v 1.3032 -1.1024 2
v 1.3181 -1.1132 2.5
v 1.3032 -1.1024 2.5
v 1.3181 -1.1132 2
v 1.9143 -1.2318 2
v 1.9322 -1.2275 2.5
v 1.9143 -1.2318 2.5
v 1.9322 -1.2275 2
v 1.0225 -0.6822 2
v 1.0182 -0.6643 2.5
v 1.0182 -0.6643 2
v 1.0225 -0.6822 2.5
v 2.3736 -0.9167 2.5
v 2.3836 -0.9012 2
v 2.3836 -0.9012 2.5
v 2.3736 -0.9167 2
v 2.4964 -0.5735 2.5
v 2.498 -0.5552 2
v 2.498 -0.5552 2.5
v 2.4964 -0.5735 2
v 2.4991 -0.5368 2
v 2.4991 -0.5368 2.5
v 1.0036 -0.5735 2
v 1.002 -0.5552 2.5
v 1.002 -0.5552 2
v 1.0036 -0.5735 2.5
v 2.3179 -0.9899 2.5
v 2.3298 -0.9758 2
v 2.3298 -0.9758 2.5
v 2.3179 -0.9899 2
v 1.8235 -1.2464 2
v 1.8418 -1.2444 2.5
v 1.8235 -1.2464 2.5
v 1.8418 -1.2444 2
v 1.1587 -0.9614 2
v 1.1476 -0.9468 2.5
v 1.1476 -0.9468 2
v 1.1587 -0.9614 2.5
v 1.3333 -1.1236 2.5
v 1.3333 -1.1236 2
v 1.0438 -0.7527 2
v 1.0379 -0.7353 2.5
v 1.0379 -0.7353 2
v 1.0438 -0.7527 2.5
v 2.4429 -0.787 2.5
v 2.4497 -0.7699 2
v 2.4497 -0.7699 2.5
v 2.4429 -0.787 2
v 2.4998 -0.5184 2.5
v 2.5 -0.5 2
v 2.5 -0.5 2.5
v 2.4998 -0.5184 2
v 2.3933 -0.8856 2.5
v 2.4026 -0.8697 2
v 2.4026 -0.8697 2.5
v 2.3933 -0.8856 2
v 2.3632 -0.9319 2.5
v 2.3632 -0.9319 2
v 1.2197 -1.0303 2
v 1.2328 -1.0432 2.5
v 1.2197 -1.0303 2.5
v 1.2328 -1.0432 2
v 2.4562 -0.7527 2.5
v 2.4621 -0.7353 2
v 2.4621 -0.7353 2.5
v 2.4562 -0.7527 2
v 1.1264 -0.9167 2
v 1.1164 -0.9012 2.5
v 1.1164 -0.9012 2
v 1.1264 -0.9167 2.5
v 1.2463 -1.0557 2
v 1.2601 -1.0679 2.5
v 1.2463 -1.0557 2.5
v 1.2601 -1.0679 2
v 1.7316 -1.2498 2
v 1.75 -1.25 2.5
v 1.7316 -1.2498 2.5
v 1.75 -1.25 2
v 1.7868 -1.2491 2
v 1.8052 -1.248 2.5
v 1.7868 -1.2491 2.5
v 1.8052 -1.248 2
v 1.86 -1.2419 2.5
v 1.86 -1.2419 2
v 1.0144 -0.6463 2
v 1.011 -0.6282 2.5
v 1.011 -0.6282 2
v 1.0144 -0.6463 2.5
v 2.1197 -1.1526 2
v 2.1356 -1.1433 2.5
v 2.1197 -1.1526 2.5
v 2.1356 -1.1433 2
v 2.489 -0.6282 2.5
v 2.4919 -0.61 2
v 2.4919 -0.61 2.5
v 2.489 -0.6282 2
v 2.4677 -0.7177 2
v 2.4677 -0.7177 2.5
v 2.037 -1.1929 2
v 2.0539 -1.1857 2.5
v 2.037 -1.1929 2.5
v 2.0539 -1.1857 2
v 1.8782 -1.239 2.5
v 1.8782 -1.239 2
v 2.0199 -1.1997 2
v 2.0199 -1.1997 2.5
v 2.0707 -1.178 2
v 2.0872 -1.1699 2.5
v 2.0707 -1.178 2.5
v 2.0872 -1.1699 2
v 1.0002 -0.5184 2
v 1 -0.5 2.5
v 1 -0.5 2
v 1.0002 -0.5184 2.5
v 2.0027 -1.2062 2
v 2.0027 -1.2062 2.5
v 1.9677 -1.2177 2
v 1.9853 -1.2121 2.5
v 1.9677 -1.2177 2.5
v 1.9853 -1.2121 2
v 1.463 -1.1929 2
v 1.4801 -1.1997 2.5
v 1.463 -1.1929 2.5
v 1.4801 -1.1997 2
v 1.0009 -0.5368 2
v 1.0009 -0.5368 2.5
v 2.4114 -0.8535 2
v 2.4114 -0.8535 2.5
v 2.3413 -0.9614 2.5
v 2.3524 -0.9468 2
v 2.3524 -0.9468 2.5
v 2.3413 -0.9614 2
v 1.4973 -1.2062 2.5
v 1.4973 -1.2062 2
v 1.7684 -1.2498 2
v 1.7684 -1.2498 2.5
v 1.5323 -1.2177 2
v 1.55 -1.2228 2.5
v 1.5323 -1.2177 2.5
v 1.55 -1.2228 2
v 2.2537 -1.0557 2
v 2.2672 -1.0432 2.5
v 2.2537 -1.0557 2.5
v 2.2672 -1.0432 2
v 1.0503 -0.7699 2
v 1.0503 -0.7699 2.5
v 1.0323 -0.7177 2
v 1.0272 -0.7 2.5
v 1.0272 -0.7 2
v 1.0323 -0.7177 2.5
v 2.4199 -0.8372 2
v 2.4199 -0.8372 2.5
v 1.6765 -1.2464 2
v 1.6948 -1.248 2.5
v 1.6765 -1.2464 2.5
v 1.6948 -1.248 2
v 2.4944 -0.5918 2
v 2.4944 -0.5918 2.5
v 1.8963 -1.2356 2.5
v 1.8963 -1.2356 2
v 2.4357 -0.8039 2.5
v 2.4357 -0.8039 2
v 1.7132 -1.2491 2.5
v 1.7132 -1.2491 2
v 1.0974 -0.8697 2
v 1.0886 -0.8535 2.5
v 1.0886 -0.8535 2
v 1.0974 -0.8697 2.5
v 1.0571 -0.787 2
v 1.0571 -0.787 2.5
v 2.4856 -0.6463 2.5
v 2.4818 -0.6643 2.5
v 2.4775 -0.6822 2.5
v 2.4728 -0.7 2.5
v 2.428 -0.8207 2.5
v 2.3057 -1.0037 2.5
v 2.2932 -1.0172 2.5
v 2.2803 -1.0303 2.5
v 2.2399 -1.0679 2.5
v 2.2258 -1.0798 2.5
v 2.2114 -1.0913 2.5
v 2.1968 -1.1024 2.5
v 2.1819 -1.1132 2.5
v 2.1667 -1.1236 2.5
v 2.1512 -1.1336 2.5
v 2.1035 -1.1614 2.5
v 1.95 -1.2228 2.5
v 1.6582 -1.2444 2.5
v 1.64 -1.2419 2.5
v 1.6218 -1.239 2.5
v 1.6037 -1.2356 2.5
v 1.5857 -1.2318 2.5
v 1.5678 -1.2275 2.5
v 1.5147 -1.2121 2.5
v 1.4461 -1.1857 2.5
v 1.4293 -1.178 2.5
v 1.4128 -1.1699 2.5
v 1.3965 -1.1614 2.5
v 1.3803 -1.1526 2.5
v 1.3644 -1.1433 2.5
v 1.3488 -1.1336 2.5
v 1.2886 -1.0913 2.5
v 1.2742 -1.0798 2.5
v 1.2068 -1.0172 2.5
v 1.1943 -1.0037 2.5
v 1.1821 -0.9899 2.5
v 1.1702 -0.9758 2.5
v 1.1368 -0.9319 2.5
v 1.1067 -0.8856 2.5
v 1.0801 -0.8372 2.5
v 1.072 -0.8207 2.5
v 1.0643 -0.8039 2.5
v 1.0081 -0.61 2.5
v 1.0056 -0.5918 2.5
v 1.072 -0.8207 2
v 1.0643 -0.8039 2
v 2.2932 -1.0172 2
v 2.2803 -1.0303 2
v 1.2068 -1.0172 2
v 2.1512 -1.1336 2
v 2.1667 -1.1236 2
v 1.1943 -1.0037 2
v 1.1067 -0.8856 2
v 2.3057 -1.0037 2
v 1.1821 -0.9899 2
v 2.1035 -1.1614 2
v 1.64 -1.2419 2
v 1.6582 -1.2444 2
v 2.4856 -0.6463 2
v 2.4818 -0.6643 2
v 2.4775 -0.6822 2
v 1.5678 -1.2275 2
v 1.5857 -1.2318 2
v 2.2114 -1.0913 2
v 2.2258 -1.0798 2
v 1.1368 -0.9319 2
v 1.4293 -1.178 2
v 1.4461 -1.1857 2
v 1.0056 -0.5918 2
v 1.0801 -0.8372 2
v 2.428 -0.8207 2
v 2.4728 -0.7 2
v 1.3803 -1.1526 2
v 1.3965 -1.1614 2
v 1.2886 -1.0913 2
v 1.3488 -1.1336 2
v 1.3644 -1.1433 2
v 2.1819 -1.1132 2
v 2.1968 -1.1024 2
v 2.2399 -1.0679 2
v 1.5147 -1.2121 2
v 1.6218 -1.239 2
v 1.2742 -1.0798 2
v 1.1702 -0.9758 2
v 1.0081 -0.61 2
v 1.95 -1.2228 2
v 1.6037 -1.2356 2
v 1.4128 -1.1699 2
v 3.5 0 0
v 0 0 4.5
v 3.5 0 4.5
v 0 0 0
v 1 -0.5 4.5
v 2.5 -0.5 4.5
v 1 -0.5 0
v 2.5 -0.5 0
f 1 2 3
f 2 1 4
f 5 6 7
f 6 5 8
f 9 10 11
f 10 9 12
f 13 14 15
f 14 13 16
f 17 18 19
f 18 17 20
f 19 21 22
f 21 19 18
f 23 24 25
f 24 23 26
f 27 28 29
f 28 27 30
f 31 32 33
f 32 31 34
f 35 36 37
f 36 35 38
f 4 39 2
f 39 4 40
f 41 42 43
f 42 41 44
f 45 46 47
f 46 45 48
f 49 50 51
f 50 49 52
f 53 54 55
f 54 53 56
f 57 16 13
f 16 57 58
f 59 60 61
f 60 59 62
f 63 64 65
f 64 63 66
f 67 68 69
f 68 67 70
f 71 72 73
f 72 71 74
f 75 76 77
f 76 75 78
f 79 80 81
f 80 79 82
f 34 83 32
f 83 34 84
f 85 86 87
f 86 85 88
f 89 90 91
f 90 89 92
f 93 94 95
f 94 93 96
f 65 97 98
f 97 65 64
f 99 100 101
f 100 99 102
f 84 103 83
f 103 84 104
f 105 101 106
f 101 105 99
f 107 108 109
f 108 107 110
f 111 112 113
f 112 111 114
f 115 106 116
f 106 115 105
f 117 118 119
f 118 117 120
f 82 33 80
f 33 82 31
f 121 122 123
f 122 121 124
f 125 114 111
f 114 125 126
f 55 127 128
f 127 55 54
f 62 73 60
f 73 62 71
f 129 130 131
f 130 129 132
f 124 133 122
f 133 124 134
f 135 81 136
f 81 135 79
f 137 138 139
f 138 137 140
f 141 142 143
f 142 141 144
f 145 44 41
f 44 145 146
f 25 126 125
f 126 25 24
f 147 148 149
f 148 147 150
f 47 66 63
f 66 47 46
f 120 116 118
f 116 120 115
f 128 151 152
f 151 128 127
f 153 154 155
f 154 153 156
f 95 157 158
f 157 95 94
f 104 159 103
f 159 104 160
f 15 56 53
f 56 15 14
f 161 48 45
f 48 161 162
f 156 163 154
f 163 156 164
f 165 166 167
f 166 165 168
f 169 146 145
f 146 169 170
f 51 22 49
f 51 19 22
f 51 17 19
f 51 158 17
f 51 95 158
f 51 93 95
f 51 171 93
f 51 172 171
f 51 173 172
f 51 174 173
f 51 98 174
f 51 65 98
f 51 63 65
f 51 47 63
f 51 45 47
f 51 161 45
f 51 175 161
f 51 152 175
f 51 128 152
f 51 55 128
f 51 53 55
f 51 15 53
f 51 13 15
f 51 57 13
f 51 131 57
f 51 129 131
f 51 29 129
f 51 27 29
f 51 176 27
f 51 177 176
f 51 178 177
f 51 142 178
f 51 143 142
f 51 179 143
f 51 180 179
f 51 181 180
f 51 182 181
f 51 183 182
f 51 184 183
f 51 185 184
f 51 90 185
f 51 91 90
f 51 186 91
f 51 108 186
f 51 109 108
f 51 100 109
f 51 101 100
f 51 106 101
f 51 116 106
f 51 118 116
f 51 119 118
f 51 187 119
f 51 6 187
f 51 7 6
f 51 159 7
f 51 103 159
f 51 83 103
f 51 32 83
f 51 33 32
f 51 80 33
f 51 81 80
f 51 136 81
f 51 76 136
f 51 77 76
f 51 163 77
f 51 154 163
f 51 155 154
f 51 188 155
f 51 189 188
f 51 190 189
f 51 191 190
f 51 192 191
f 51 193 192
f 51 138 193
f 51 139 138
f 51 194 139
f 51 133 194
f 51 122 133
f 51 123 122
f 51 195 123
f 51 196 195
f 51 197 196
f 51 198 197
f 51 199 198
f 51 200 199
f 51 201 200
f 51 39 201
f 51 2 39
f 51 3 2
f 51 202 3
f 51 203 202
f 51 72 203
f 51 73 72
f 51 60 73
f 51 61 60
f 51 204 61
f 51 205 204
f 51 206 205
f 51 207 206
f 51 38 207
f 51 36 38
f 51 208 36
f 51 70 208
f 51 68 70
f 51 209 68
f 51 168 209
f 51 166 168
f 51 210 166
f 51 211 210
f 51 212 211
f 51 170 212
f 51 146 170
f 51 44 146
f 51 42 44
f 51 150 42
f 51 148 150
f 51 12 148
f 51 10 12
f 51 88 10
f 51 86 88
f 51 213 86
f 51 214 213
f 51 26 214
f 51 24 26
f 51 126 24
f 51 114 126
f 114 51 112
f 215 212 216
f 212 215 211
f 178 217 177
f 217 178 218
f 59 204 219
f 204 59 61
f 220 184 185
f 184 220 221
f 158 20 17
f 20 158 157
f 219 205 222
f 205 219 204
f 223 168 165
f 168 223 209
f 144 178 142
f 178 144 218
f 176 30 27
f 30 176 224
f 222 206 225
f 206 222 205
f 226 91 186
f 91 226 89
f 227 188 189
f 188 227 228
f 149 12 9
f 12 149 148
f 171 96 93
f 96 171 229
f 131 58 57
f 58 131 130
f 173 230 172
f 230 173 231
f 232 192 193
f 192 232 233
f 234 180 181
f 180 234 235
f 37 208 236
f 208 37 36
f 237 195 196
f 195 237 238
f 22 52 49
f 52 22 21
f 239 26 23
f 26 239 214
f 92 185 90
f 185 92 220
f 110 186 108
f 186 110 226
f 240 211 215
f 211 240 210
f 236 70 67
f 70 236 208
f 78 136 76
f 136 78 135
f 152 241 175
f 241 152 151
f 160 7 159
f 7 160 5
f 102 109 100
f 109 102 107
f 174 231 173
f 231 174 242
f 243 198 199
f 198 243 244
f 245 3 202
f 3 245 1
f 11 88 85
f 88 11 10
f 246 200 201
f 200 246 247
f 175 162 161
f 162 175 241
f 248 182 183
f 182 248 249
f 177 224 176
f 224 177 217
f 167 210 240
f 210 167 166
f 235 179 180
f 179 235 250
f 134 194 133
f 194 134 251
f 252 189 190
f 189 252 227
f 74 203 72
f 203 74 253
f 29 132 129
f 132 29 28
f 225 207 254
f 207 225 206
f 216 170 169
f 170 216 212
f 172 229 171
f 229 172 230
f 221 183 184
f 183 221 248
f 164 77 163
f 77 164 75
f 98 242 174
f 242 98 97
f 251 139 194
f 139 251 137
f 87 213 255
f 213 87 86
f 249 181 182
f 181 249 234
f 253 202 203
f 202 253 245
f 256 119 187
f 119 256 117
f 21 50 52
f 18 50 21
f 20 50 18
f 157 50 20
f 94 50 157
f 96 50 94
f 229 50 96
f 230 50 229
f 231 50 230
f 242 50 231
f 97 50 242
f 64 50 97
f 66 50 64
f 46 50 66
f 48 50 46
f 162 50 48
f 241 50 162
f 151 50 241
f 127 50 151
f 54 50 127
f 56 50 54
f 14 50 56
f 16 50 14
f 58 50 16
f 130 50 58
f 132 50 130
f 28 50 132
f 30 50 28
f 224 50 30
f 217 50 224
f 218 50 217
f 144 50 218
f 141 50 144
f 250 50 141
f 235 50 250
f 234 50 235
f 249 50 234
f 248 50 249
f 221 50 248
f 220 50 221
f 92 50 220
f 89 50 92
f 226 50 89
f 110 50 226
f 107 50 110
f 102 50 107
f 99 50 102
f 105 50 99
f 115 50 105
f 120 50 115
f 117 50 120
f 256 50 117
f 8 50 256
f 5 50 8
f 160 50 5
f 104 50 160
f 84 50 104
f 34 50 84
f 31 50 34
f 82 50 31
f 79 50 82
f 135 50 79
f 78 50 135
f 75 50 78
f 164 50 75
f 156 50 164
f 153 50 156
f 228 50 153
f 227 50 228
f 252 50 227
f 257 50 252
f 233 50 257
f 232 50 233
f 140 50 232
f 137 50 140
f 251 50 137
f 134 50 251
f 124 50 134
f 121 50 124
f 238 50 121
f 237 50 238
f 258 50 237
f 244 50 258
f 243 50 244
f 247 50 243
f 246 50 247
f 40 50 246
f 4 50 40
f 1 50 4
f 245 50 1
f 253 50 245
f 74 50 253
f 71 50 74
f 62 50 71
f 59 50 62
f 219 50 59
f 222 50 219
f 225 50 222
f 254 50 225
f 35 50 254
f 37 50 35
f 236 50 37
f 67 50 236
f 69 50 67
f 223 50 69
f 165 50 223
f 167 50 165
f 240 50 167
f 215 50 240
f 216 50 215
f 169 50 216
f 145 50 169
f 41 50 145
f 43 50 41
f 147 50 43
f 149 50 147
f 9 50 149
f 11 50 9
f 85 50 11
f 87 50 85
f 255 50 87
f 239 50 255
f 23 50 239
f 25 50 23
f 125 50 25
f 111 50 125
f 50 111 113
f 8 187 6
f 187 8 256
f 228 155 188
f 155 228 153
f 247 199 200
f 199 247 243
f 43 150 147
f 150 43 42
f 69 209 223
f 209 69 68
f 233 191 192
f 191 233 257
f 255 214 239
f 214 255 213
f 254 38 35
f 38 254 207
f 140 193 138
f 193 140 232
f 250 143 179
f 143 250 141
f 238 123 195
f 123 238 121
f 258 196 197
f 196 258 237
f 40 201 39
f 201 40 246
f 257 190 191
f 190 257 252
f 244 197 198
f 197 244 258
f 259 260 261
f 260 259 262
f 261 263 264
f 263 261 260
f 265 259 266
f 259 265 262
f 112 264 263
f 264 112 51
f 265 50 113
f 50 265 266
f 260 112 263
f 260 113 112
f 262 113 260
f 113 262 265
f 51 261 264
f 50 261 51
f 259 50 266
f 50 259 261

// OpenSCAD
// file: modules/slider.scad
module slider(panel_width, panel_depth, panel_height, track_width){
    tab_hieght=panel_depth;
    module prism(l, w, h){
      polyhedron(//pt 0        1        2        3        4        5
              points=[[0,0,0], [l,0,0], [l,w,0], [0,w,0], [0,w,h], [l,w,h]],
              faces=[[0,1,2,3],[5,4,3,2],[0,4,5,1],[0,3,4],[5,2,1]]
              );
    }
    translate([track_width,-panel_depth,0]){

    //panel
    cube([panel_width, panel_depth, panel_height], false);

    //tracks (top)
    translate([-track_width,panel_depth,panel_height])
    rotate(90,[0,1,0])
    rotate(90,[1,0,0])
    prism(panel_height, track_width, panel_depth);
    //tracks (top)
    translate([track_width+panel_width,panel_depth,0])
    rotate(90*3,[0,1,0])
    rotate(90,[1,0,0])
    prism(panel_height, track_width, panel_depth);
    //tab
    difference () {
        translate([panel_width/2,0,panel_height/2])
        cylinder(h = tab_hieght, r1 = panel_width/2, r2 = panel_width/2, center = true, $fn=256);
        translate([0,panel_depth,0])
        cube([panel_width, panel_depth, panel_height], false);
    }
    }
}
// main file
include <./modules/slider.scad>

slider(panel_width=1.5,panel_depth=0.5,panel_height=4.5,track_width=1);
